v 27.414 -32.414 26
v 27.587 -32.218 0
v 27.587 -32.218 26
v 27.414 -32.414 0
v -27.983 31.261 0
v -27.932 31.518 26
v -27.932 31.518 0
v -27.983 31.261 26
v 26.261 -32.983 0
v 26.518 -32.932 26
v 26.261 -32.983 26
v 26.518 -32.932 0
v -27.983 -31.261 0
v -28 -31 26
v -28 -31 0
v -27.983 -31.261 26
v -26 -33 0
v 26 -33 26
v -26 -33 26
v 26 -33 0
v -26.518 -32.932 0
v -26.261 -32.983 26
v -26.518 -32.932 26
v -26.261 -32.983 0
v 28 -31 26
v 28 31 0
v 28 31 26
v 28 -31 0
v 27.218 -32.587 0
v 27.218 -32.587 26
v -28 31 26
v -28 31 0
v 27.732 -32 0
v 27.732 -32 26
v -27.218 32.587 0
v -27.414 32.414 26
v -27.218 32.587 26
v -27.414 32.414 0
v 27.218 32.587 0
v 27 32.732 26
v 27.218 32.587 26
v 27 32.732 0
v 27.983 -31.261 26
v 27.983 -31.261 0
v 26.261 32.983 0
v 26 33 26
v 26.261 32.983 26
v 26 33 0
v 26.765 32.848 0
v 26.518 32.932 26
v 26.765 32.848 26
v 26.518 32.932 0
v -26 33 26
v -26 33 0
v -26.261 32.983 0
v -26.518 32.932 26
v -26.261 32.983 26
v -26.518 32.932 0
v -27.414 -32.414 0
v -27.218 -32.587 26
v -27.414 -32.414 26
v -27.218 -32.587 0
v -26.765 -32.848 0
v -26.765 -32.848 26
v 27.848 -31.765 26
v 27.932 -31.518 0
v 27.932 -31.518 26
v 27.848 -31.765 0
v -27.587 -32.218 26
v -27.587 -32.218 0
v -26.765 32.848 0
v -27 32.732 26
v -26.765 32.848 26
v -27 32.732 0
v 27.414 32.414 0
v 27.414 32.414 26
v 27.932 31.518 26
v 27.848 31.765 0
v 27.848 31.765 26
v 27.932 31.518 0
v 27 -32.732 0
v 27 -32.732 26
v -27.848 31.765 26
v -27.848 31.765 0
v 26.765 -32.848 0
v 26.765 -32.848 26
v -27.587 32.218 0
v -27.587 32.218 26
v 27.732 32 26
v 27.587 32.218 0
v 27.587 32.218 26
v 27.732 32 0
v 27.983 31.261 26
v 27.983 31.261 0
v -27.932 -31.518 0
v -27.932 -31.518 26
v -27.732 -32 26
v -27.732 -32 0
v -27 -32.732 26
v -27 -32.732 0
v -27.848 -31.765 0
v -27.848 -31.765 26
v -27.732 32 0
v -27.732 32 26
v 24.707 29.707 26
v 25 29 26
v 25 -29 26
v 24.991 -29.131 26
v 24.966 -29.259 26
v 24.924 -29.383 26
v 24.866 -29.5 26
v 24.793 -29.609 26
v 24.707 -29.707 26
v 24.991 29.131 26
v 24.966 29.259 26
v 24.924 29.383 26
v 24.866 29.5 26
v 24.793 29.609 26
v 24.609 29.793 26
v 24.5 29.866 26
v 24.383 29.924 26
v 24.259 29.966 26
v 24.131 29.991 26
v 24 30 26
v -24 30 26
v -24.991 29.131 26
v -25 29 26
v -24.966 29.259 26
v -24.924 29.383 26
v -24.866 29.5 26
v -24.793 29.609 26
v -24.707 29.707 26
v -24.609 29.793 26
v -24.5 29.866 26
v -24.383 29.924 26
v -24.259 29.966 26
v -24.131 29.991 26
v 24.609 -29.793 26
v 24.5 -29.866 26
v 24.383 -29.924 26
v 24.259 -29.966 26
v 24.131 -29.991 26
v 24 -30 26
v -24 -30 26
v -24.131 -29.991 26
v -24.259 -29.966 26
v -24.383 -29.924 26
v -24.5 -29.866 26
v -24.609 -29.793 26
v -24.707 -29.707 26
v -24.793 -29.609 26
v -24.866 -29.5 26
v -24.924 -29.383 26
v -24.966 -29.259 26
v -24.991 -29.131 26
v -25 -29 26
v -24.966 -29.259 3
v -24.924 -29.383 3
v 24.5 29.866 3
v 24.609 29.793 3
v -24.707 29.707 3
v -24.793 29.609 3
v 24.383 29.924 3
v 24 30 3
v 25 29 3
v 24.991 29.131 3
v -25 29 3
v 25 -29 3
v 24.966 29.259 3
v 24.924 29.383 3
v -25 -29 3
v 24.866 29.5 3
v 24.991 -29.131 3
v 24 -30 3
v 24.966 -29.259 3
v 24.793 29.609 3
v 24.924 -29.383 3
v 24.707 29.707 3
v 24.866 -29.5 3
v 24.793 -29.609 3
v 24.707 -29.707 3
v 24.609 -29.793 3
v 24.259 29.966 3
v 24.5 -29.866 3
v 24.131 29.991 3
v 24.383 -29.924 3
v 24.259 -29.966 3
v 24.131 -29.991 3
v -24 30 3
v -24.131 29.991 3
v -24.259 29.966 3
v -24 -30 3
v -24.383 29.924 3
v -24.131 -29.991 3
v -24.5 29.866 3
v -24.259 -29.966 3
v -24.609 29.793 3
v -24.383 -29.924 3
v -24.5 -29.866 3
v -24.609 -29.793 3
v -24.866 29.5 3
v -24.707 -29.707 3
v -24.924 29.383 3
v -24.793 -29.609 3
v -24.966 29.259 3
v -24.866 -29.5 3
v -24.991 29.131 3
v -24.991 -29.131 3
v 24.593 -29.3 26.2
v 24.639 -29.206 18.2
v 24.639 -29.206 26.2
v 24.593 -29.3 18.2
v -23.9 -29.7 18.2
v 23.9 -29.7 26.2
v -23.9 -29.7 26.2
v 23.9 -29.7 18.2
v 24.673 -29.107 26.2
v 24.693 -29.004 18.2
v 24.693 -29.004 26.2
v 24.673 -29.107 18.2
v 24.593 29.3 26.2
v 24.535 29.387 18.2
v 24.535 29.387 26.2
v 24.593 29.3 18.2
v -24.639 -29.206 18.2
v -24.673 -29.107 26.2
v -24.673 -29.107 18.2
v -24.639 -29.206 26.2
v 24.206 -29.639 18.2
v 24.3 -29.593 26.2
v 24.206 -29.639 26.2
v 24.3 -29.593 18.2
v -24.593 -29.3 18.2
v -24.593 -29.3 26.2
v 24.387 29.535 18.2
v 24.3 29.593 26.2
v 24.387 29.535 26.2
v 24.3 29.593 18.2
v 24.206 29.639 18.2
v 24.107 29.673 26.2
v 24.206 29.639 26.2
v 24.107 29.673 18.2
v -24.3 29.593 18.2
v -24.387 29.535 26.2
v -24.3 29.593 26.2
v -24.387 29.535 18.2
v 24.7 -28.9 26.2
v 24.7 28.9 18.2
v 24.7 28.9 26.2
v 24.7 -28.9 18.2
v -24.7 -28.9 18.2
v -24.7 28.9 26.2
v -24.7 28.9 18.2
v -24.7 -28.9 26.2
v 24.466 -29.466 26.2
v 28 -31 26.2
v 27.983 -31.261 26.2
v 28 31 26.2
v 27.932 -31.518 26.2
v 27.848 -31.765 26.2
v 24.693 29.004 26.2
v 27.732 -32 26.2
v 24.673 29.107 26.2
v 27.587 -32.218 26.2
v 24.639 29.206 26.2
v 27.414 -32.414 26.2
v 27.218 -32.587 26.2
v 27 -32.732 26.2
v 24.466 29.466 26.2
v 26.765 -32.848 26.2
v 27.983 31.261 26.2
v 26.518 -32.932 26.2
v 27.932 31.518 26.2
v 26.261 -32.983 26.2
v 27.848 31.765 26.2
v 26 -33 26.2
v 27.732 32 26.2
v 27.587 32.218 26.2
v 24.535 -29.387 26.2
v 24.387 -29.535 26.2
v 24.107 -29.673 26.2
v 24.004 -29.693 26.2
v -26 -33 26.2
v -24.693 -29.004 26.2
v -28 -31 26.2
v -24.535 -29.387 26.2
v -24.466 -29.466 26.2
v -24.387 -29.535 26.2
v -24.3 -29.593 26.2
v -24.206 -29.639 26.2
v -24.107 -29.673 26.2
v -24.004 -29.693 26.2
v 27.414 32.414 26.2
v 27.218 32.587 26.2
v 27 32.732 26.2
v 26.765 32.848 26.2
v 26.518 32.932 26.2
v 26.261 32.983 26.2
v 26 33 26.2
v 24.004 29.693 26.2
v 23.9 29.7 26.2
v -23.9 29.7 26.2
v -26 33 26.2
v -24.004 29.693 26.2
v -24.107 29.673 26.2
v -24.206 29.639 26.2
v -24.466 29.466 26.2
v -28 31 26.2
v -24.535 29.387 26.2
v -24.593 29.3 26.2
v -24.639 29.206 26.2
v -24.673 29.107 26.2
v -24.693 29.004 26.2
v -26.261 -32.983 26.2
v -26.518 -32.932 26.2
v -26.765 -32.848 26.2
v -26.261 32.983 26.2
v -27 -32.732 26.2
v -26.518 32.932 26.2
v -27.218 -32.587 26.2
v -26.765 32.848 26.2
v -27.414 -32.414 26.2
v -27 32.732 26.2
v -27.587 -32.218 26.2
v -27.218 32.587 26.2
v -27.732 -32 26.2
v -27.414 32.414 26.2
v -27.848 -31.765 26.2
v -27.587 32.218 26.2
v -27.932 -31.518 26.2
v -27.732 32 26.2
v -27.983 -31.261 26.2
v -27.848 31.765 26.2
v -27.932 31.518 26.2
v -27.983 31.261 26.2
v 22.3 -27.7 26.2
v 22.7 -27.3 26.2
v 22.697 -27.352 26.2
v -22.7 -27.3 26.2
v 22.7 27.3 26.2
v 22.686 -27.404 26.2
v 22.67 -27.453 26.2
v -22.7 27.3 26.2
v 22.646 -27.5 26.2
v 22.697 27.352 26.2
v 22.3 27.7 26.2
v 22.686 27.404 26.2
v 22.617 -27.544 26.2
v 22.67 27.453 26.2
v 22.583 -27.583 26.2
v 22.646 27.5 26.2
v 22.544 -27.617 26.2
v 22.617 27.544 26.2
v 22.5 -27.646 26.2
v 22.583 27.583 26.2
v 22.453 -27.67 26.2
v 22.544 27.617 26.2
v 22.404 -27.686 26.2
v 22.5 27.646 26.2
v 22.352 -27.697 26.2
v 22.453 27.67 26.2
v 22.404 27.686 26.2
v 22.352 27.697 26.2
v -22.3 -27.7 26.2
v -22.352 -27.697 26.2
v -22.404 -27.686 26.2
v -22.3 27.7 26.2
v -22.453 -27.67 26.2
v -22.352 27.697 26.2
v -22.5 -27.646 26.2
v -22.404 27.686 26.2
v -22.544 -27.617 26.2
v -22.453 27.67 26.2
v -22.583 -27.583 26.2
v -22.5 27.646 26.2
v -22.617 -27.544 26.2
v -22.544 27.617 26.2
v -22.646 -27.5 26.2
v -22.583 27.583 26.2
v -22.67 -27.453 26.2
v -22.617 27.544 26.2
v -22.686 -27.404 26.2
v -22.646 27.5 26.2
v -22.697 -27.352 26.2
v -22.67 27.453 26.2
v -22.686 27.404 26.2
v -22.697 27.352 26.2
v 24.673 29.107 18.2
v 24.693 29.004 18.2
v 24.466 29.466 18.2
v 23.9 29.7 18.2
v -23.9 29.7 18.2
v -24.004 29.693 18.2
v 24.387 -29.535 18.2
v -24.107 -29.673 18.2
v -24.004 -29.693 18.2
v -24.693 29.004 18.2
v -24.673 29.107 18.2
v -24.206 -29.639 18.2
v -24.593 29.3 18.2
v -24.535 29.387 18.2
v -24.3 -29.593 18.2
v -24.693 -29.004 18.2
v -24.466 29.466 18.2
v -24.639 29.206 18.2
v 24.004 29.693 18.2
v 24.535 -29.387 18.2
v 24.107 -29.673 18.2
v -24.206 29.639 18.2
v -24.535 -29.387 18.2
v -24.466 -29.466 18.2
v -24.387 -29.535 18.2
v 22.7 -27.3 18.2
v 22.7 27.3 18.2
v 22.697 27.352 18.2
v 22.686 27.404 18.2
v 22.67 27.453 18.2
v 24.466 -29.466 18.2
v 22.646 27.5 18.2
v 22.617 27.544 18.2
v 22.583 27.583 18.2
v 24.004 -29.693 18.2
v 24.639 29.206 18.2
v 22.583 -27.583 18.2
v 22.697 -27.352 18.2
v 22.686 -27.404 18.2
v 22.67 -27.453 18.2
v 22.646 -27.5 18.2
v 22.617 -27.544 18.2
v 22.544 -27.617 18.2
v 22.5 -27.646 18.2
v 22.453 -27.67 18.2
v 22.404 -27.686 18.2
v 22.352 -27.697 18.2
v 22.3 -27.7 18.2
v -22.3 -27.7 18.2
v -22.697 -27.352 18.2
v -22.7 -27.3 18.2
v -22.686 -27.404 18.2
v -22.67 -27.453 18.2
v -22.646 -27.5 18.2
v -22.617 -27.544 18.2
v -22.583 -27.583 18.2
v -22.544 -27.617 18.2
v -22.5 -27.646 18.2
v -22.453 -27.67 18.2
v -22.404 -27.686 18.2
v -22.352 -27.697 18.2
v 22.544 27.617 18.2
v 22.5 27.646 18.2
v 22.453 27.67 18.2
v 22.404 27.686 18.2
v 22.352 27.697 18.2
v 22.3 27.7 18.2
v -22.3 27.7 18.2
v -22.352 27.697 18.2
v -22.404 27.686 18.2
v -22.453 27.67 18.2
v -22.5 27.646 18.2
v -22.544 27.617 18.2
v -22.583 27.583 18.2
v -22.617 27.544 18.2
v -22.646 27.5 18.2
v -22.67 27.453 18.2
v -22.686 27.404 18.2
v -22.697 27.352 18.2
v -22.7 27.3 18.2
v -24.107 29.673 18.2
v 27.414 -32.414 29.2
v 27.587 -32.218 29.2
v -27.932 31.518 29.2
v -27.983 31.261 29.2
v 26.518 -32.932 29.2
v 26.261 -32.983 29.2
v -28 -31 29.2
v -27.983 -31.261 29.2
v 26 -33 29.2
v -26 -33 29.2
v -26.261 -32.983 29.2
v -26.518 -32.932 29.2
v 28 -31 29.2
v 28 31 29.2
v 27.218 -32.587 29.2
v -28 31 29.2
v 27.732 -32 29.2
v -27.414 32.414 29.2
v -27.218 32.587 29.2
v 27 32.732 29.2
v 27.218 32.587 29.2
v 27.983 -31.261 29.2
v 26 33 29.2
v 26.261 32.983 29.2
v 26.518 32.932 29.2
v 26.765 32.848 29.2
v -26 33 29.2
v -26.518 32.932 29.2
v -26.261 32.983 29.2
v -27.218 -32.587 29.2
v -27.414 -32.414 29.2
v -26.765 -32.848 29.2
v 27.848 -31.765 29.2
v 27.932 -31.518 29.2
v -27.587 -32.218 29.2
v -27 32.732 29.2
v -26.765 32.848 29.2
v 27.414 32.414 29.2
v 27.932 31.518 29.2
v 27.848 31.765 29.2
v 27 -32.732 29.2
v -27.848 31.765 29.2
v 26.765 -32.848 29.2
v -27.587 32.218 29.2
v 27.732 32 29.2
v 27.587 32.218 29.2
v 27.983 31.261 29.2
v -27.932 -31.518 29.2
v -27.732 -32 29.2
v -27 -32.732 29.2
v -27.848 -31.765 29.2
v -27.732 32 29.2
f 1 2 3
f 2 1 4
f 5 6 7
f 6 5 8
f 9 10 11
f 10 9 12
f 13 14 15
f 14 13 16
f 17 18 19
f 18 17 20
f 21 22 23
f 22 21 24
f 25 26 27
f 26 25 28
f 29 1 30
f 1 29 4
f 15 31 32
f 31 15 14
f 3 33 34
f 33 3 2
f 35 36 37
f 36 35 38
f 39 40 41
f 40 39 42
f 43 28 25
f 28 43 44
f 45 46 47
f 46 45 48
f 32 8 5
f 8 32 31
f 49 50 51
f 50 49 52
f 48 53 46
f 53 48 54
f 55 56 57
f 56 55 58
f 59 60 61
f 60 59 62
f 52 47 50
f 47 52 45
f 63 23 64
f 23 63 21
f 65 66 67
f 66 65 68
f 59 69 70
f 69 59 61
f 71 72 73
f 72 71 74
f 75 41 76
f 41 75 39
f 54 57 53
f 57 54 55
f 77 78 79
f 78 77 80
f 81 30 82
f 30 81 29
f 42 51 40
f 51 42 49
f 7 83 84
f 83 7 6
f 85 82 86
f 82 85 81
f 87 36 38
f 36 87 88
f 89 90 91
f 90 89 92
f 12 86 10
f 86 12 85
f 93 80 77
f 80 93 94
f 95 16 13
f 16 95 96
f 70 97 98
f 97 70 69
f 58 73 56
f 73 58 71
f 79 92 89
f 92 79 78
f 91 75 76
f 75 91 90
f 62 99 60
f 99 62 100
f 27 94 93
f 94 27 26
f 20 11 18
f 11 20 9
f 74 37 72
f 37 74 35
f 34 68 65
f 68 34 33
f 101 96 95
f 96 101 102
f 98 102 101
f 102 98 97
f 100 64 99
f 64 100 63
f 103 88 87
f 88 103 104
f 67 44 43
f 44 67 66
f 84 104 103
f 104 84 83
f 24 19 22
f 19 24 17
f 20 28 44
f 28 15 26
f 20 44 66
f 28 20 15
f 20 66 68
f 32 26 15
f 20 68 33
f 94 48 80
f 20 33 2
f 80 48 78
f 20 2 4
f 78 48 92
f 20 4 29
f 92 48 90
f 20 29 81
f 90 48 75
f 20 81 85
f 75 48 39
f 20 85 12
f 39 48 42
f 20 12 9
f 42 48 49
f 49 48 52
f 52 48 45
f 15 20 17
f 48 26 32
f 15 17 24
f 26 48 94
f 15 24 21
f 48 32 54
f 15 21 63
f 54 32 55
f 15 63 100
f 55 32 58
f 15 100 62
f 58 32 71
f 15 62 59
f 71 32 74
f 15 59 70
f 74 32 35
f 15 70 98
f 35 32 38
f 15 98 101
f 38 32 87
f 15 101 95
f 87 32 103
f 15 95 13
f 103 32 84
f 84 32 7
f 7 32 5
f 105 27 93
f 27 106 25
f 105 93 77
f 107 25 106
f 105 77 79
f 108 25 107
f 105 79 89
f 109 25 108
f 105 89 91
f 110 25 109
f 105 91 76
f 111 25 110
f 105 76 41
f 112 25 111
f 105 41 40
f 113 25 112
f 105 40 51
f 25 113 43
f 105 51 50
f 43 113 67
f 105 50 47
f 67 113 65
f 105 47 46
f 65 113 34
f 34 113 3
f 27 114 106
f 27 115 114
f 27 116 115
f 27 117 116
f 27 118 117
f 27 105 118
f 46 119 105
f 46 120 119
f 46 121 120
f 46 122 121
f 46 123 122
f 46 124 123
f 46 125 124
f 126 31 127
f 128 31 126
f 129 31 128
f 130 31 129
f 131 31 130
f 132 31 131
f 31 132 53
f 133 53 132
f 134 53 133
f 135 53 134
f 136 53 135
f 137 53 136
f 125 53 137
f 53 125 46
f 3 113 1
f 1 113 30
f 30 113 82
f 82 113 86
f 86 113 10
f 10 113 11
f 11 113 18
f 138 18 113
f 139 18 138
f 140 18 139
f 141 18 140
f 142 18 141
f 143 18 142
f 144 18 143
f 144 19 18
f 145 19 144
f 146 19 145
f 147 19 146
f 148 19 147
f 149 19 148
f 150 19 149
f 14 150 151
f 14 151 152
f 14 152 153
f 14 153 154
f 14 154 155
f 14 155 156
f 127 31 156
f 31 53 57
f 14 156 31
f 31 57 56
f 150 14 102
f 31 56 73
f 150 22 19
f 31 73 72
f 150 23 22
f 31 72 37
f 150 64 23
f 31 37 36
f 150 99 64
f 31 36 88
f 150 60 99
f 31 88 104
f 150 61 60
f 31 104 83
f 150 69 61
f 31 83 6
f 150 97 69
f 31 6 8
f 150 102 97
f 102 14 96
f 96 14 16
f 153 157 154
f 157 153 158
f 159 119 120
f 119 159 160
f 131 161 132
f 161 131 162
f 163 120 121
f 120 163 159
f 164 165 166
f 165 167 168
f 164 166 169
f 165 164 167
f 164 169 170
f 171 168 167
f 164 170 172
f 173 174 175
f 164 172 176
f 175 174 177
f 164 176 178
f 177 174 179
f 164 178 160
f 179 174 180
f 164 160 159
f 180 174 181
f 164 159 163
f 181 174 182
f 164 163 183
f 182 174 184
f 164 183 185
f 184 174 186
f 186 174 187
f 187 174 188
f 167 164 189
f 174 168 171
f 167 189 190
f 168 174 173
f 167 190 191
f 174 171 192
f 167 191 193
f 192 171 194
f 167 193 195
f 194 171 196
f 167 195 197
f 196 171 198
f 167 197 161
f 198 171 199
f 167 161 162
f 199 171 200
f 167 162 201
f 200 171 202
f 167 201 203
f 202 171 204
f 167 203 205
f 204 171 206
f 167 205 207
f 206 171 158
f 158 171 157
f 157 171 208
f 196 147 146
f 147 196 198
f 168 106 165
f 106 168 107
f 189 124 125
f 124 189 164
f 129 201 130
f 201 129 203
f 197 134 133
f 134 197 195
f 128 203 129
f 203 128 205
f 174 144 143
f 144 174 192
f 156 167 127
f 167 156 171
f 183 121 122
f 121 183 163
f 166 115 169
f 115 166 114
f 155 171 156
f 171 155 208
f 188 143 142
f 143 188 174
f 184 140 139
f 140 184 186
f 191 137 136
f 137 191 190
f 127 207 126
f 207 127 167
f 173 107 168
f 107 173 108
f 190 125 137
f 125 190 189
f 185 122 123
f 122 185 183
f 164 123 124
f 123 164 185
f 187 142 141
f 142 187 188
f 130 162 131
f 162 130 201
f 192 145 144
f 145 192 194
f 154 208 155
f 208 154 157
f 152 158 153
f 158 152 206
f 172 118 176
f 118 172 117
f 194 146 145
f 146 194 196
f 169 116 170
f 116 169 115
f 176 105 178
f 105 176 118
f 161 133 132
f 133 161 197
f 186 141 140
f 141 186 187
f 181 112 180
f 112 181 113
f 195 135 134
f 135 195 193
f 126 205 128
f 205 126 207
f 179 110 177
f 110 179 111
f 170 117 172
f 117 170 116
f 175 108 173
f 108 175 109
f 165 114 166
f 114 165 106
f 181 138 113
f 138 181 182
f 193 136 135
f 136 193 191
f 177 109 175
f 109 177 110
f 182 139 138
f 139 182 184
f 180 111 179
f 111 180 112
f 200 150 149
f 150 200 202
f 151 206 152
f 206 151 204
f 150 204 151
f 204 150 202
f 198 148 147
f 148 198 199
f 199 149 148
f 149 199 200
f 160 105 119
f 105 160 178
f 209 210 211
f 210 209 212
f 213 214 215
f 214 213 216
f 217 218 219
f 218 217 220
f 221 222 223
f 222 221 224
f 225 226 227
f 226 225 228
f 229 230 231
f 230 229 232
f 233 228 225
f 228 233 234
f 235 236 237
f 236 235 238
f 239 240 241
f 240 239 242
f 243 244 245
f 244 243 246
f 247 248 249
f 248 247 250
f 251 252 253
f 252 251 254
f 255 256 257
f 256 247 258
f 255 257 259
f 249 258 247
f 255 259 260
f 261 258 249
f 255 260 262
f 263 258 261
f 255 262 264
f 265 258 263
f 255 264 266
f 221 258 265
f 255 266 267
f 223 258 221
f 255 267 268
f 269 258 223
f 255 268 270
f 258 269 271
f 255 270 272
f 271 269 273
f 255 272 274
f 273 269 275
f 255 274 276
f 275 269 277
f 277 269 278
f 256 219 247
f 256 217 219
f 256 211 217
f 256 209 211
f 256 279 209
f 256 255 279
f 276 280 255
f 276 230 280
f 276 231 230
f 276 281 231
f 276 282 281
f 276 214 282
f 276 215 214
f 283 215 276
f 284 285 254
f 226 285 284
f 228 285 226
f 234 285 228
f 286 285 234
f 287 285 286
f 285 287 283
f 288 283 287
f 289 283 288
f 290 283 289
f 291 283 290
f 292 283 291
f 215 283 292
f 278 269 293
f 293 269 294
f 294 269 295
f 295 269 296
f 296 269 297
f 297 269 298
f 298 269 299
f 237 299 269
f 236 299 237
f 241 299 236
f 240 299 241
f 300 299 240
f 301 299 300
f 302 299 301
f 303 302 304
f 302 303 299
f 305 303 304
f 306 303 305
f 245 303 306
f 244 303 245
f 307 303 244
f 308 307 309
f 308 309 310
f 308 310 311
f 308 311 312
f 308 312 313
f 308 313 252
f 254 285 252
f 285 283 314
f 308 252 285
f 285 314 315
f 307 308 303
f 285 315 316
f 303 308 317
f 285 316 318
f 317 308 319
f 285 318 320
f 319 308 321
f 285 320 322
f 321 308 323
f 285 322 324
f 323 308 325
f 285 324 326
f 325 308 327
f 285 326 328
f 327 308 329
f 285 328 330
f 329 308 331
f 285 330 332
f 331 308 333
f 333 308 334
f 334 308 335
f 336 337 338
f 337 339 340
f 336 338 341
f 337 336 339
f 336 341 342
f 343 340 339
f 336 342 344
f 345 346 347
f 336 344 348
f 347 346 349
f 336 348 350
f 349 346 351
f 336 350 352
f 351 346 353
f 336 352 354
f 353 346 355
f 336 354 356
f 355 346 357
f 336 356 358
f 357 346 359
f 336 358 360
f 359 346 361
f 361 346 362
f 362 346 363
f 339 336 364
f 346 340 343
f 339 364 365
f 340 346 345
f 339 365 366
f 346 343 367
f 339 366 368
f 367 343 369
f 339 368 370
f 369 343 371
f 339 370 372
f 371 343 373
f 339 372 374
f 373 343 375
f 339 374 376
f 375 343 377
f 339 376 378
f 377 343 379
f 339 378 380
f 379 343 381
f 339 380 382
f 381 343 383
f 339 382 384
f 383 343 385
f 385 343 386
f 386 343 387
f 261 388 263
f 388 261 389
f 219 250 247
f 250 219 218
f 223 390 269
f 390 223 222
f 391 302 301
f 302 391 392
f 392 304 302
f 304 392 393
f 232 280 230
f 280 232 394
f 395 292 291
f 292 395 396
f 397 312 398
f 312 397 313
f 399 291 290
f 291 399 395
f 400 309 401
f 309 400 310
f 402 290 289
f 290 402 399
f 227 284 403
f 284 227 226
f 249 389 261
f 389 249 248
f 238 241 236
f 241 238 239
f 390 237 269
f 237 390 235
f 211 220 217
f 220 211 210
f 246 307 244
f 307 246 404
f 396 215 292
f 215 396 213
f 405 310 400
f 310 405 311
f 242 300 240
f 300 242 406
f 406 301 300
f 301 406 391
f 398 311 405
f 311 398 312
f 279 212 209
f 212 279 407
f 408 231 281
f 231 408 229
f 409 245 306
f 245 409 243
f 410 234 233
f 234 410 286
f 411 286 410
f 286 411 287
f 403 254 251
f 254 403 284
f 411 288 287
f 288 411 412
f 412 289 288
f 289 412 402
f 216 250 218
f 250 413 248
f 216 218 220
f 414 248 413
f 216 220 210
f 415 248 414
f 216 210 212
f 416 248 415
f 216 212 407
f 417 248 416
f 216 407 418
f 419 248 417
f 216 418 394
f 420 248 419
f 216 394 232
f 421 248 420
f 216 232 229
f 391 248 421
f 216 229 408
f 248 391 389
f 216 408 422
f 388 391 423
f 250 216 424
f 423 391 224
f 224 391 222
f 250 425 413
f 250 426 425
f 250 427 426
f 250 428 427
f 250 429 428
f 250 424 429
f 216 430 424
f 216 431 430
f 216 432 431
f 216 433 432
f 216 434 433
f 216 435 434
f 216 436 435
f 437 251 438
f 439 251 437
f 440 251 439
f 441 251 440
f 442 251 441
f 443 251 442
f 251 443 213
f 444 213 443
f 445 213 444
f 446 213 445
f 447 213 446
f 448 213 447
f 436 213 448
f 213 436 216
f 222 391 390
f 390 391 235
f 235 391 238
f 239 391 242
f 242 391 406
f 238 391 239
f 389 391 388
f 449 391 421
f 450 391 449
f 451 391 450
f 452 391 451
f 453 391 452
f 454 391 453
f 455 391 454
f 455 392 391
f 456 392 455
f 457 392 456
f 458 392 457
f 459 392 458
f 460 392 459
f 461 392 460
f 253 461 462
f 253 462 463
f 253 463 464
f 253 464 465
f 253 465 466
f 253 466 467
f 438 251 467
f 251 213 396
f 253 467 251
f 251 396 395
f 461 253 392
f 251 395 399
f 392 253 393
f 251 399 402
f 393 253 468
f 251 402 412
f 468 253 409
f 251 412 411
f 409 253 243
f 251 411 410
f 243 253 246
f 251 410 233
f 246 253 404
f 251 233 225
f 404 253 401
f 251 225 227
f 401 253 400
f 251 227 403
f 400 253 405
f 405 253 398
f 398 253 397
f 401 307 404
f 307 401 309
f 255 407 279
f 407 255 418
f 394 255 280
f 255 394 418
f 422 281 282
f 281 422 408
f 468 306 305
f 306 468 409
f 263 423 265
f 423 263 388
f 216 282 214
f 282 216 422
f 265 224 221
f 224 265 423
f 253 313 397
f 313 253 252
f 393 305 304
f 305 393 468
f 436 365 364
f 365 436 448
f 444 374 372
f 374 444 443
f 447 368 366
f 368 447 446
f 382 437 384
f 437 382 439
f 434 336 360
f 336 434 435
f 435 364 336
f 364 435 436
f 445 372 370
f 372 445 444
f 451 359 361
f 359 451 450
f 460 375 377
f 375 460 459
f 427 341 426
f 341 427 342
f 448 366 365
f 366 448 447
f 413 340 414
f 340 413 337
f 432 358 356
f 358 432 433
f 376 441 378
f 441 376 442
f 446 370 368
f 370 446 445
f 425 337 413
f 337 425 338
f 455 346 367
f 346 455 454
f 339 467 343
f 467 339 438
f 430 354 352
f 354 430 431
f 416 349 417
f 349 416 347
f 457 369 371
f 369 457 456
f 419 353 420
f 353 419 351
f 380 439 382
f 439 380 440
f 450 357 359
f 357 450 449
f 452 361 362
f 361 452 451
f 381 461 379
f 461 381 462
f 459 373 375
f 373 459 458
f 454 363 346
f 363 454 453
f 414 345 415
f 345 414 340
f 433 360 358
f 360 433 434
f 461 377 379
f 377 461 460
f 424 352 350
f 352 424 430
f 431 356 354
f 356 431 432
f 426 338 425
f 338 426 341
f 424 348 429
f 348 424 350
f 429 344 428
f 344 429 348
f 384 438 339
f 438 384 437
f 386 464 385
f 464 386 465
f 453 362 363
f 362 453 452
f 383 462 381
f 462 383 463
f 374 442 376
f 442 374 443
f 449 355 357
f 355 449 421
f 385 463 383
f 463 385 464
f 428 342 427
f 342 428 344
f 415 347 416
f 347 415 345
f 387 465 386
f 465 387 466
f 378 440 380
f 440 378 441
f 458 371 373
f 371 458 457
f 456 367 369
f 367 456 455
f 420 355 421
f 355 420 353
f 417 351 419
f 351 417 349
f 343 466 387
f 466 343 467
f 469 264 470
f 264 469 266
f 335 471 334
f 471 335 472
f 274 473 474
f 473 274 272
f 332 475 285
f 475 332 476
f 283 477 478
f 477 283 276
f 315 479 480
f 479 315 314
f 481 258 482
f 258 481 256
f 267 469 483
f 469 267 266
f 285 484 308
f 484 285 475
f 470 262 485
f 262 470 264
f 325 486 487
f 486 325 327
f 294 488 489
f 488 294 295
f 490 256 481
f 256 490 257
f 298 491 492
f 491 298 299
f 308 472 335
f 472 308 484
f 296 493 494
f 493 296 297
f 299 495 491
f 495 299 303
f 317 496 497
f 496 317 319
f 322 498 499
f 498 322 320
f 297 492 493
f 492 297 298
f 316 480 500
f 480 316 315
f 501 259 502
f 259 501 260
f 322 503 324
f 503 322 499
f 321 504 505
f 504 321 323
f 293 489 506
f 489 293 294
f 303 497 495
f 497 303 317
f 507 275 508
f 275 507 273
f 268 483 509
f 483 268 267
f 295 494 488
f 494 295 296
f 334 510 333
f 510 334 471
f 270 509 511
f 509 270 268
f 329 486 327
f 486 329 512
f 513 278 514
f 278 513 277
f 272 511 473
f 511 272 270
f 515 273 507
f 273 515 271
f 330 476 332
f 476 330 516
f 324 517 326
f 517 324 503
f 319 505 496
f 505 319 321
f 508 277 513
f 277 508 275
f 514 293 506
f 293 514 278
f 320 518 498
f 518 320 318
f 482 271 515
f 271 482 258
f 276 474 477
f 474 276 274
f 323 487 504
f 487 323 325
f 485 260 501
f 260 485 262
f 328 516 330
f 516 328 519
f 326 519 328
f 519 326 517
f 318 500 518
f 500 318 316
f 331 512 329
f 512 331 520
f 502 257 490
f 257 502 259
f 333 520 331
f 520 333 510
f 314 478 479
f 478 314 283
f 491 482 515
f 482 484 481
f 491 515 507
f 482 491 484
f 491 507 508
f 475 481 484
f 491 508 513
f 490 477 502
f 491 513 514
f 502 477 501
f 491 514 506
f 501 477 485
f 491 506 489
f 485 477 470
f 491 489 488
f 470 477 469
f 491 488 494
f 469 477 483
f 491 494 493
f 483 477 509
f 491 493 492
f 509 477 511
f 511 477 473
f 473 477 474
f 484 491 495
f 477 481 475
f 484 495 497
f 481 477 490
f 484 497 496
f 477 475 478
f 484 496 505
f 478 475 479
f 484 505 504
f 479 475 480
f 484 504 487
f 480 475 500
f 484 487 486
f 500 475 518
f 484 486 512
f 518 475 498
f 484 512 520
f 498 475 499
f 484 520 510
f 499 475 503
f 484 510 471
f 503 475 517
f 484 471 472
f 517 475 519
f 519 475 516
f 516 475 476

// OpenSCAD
$fn = 48;

wall = 3.0;
clearance = 0.30;

cavity_x = 50;
cavity_y = 60;
cavity_h = 20;

base_floor = wall;
base_wall_h = cavity_h + wall;      // side wall rises above usable cavity
lid_top = wall;
lid_skirt_h = 8;
lid_skirt_wall = 2.0;
lid_gap_z = 0.20;

outer_x = cavity_x + 2 * wall;
outer_y = cavity_y + 2 * wall;
base_h = base_floor + cavity_h + wall;

lid_outer_x = outer_x;
lid_outer_y = outer_y;
lid_h = lid_top + lid_skirt_h;

skirt_outer_x = cavity_x - 2 * clearance;
skirt_outer_y = cavity_y - 2 * clearance;
skirt_inner_x = skirt_outer_x - 2 * lid_skirt_wall;
skirt_inner_y = skirt_outer_y - 2 * lid_skirt_wall;

module rounded_box(size, r) {
    hull() {
        for (x = [-size[0] / 2 + r, size[0] / 2 - r])
        for (y = [-size[1] / 2 + r, size[1] / 2 - r])
            translate([x, y, 0])
                cylinder(h = size[2], r = r);
    }
}

module base() {
    difference() {
        rounded_box([outer_x, outer_y, base_h], 2.0);

        translate([0, 0, base_floor])
            rounded_box([cavity_x, cavity_y, base_h + 0.2], 1.0);
    }
}

module lid() {
    translate([0, 0, base_h + lid_gap_z])
        union() {
            rounded_box([lid_outer_x, lid_outer_y, lid_top], 2.0);

            translate([0, 0, -lid_skirt_h])
                difference() {
                    rounded_box([skirt_outer_x, skirt_outer_y, lid_skirt_h], 0.8);

                    translate([0, 0, -0.1])
                        rounded_box([skirt_inner_x, skirt_inner_y, lid_skirt_h + 0.2], 0.4);
                }
        }
}

color("lightgray") base();
color("steelblue") lid();
